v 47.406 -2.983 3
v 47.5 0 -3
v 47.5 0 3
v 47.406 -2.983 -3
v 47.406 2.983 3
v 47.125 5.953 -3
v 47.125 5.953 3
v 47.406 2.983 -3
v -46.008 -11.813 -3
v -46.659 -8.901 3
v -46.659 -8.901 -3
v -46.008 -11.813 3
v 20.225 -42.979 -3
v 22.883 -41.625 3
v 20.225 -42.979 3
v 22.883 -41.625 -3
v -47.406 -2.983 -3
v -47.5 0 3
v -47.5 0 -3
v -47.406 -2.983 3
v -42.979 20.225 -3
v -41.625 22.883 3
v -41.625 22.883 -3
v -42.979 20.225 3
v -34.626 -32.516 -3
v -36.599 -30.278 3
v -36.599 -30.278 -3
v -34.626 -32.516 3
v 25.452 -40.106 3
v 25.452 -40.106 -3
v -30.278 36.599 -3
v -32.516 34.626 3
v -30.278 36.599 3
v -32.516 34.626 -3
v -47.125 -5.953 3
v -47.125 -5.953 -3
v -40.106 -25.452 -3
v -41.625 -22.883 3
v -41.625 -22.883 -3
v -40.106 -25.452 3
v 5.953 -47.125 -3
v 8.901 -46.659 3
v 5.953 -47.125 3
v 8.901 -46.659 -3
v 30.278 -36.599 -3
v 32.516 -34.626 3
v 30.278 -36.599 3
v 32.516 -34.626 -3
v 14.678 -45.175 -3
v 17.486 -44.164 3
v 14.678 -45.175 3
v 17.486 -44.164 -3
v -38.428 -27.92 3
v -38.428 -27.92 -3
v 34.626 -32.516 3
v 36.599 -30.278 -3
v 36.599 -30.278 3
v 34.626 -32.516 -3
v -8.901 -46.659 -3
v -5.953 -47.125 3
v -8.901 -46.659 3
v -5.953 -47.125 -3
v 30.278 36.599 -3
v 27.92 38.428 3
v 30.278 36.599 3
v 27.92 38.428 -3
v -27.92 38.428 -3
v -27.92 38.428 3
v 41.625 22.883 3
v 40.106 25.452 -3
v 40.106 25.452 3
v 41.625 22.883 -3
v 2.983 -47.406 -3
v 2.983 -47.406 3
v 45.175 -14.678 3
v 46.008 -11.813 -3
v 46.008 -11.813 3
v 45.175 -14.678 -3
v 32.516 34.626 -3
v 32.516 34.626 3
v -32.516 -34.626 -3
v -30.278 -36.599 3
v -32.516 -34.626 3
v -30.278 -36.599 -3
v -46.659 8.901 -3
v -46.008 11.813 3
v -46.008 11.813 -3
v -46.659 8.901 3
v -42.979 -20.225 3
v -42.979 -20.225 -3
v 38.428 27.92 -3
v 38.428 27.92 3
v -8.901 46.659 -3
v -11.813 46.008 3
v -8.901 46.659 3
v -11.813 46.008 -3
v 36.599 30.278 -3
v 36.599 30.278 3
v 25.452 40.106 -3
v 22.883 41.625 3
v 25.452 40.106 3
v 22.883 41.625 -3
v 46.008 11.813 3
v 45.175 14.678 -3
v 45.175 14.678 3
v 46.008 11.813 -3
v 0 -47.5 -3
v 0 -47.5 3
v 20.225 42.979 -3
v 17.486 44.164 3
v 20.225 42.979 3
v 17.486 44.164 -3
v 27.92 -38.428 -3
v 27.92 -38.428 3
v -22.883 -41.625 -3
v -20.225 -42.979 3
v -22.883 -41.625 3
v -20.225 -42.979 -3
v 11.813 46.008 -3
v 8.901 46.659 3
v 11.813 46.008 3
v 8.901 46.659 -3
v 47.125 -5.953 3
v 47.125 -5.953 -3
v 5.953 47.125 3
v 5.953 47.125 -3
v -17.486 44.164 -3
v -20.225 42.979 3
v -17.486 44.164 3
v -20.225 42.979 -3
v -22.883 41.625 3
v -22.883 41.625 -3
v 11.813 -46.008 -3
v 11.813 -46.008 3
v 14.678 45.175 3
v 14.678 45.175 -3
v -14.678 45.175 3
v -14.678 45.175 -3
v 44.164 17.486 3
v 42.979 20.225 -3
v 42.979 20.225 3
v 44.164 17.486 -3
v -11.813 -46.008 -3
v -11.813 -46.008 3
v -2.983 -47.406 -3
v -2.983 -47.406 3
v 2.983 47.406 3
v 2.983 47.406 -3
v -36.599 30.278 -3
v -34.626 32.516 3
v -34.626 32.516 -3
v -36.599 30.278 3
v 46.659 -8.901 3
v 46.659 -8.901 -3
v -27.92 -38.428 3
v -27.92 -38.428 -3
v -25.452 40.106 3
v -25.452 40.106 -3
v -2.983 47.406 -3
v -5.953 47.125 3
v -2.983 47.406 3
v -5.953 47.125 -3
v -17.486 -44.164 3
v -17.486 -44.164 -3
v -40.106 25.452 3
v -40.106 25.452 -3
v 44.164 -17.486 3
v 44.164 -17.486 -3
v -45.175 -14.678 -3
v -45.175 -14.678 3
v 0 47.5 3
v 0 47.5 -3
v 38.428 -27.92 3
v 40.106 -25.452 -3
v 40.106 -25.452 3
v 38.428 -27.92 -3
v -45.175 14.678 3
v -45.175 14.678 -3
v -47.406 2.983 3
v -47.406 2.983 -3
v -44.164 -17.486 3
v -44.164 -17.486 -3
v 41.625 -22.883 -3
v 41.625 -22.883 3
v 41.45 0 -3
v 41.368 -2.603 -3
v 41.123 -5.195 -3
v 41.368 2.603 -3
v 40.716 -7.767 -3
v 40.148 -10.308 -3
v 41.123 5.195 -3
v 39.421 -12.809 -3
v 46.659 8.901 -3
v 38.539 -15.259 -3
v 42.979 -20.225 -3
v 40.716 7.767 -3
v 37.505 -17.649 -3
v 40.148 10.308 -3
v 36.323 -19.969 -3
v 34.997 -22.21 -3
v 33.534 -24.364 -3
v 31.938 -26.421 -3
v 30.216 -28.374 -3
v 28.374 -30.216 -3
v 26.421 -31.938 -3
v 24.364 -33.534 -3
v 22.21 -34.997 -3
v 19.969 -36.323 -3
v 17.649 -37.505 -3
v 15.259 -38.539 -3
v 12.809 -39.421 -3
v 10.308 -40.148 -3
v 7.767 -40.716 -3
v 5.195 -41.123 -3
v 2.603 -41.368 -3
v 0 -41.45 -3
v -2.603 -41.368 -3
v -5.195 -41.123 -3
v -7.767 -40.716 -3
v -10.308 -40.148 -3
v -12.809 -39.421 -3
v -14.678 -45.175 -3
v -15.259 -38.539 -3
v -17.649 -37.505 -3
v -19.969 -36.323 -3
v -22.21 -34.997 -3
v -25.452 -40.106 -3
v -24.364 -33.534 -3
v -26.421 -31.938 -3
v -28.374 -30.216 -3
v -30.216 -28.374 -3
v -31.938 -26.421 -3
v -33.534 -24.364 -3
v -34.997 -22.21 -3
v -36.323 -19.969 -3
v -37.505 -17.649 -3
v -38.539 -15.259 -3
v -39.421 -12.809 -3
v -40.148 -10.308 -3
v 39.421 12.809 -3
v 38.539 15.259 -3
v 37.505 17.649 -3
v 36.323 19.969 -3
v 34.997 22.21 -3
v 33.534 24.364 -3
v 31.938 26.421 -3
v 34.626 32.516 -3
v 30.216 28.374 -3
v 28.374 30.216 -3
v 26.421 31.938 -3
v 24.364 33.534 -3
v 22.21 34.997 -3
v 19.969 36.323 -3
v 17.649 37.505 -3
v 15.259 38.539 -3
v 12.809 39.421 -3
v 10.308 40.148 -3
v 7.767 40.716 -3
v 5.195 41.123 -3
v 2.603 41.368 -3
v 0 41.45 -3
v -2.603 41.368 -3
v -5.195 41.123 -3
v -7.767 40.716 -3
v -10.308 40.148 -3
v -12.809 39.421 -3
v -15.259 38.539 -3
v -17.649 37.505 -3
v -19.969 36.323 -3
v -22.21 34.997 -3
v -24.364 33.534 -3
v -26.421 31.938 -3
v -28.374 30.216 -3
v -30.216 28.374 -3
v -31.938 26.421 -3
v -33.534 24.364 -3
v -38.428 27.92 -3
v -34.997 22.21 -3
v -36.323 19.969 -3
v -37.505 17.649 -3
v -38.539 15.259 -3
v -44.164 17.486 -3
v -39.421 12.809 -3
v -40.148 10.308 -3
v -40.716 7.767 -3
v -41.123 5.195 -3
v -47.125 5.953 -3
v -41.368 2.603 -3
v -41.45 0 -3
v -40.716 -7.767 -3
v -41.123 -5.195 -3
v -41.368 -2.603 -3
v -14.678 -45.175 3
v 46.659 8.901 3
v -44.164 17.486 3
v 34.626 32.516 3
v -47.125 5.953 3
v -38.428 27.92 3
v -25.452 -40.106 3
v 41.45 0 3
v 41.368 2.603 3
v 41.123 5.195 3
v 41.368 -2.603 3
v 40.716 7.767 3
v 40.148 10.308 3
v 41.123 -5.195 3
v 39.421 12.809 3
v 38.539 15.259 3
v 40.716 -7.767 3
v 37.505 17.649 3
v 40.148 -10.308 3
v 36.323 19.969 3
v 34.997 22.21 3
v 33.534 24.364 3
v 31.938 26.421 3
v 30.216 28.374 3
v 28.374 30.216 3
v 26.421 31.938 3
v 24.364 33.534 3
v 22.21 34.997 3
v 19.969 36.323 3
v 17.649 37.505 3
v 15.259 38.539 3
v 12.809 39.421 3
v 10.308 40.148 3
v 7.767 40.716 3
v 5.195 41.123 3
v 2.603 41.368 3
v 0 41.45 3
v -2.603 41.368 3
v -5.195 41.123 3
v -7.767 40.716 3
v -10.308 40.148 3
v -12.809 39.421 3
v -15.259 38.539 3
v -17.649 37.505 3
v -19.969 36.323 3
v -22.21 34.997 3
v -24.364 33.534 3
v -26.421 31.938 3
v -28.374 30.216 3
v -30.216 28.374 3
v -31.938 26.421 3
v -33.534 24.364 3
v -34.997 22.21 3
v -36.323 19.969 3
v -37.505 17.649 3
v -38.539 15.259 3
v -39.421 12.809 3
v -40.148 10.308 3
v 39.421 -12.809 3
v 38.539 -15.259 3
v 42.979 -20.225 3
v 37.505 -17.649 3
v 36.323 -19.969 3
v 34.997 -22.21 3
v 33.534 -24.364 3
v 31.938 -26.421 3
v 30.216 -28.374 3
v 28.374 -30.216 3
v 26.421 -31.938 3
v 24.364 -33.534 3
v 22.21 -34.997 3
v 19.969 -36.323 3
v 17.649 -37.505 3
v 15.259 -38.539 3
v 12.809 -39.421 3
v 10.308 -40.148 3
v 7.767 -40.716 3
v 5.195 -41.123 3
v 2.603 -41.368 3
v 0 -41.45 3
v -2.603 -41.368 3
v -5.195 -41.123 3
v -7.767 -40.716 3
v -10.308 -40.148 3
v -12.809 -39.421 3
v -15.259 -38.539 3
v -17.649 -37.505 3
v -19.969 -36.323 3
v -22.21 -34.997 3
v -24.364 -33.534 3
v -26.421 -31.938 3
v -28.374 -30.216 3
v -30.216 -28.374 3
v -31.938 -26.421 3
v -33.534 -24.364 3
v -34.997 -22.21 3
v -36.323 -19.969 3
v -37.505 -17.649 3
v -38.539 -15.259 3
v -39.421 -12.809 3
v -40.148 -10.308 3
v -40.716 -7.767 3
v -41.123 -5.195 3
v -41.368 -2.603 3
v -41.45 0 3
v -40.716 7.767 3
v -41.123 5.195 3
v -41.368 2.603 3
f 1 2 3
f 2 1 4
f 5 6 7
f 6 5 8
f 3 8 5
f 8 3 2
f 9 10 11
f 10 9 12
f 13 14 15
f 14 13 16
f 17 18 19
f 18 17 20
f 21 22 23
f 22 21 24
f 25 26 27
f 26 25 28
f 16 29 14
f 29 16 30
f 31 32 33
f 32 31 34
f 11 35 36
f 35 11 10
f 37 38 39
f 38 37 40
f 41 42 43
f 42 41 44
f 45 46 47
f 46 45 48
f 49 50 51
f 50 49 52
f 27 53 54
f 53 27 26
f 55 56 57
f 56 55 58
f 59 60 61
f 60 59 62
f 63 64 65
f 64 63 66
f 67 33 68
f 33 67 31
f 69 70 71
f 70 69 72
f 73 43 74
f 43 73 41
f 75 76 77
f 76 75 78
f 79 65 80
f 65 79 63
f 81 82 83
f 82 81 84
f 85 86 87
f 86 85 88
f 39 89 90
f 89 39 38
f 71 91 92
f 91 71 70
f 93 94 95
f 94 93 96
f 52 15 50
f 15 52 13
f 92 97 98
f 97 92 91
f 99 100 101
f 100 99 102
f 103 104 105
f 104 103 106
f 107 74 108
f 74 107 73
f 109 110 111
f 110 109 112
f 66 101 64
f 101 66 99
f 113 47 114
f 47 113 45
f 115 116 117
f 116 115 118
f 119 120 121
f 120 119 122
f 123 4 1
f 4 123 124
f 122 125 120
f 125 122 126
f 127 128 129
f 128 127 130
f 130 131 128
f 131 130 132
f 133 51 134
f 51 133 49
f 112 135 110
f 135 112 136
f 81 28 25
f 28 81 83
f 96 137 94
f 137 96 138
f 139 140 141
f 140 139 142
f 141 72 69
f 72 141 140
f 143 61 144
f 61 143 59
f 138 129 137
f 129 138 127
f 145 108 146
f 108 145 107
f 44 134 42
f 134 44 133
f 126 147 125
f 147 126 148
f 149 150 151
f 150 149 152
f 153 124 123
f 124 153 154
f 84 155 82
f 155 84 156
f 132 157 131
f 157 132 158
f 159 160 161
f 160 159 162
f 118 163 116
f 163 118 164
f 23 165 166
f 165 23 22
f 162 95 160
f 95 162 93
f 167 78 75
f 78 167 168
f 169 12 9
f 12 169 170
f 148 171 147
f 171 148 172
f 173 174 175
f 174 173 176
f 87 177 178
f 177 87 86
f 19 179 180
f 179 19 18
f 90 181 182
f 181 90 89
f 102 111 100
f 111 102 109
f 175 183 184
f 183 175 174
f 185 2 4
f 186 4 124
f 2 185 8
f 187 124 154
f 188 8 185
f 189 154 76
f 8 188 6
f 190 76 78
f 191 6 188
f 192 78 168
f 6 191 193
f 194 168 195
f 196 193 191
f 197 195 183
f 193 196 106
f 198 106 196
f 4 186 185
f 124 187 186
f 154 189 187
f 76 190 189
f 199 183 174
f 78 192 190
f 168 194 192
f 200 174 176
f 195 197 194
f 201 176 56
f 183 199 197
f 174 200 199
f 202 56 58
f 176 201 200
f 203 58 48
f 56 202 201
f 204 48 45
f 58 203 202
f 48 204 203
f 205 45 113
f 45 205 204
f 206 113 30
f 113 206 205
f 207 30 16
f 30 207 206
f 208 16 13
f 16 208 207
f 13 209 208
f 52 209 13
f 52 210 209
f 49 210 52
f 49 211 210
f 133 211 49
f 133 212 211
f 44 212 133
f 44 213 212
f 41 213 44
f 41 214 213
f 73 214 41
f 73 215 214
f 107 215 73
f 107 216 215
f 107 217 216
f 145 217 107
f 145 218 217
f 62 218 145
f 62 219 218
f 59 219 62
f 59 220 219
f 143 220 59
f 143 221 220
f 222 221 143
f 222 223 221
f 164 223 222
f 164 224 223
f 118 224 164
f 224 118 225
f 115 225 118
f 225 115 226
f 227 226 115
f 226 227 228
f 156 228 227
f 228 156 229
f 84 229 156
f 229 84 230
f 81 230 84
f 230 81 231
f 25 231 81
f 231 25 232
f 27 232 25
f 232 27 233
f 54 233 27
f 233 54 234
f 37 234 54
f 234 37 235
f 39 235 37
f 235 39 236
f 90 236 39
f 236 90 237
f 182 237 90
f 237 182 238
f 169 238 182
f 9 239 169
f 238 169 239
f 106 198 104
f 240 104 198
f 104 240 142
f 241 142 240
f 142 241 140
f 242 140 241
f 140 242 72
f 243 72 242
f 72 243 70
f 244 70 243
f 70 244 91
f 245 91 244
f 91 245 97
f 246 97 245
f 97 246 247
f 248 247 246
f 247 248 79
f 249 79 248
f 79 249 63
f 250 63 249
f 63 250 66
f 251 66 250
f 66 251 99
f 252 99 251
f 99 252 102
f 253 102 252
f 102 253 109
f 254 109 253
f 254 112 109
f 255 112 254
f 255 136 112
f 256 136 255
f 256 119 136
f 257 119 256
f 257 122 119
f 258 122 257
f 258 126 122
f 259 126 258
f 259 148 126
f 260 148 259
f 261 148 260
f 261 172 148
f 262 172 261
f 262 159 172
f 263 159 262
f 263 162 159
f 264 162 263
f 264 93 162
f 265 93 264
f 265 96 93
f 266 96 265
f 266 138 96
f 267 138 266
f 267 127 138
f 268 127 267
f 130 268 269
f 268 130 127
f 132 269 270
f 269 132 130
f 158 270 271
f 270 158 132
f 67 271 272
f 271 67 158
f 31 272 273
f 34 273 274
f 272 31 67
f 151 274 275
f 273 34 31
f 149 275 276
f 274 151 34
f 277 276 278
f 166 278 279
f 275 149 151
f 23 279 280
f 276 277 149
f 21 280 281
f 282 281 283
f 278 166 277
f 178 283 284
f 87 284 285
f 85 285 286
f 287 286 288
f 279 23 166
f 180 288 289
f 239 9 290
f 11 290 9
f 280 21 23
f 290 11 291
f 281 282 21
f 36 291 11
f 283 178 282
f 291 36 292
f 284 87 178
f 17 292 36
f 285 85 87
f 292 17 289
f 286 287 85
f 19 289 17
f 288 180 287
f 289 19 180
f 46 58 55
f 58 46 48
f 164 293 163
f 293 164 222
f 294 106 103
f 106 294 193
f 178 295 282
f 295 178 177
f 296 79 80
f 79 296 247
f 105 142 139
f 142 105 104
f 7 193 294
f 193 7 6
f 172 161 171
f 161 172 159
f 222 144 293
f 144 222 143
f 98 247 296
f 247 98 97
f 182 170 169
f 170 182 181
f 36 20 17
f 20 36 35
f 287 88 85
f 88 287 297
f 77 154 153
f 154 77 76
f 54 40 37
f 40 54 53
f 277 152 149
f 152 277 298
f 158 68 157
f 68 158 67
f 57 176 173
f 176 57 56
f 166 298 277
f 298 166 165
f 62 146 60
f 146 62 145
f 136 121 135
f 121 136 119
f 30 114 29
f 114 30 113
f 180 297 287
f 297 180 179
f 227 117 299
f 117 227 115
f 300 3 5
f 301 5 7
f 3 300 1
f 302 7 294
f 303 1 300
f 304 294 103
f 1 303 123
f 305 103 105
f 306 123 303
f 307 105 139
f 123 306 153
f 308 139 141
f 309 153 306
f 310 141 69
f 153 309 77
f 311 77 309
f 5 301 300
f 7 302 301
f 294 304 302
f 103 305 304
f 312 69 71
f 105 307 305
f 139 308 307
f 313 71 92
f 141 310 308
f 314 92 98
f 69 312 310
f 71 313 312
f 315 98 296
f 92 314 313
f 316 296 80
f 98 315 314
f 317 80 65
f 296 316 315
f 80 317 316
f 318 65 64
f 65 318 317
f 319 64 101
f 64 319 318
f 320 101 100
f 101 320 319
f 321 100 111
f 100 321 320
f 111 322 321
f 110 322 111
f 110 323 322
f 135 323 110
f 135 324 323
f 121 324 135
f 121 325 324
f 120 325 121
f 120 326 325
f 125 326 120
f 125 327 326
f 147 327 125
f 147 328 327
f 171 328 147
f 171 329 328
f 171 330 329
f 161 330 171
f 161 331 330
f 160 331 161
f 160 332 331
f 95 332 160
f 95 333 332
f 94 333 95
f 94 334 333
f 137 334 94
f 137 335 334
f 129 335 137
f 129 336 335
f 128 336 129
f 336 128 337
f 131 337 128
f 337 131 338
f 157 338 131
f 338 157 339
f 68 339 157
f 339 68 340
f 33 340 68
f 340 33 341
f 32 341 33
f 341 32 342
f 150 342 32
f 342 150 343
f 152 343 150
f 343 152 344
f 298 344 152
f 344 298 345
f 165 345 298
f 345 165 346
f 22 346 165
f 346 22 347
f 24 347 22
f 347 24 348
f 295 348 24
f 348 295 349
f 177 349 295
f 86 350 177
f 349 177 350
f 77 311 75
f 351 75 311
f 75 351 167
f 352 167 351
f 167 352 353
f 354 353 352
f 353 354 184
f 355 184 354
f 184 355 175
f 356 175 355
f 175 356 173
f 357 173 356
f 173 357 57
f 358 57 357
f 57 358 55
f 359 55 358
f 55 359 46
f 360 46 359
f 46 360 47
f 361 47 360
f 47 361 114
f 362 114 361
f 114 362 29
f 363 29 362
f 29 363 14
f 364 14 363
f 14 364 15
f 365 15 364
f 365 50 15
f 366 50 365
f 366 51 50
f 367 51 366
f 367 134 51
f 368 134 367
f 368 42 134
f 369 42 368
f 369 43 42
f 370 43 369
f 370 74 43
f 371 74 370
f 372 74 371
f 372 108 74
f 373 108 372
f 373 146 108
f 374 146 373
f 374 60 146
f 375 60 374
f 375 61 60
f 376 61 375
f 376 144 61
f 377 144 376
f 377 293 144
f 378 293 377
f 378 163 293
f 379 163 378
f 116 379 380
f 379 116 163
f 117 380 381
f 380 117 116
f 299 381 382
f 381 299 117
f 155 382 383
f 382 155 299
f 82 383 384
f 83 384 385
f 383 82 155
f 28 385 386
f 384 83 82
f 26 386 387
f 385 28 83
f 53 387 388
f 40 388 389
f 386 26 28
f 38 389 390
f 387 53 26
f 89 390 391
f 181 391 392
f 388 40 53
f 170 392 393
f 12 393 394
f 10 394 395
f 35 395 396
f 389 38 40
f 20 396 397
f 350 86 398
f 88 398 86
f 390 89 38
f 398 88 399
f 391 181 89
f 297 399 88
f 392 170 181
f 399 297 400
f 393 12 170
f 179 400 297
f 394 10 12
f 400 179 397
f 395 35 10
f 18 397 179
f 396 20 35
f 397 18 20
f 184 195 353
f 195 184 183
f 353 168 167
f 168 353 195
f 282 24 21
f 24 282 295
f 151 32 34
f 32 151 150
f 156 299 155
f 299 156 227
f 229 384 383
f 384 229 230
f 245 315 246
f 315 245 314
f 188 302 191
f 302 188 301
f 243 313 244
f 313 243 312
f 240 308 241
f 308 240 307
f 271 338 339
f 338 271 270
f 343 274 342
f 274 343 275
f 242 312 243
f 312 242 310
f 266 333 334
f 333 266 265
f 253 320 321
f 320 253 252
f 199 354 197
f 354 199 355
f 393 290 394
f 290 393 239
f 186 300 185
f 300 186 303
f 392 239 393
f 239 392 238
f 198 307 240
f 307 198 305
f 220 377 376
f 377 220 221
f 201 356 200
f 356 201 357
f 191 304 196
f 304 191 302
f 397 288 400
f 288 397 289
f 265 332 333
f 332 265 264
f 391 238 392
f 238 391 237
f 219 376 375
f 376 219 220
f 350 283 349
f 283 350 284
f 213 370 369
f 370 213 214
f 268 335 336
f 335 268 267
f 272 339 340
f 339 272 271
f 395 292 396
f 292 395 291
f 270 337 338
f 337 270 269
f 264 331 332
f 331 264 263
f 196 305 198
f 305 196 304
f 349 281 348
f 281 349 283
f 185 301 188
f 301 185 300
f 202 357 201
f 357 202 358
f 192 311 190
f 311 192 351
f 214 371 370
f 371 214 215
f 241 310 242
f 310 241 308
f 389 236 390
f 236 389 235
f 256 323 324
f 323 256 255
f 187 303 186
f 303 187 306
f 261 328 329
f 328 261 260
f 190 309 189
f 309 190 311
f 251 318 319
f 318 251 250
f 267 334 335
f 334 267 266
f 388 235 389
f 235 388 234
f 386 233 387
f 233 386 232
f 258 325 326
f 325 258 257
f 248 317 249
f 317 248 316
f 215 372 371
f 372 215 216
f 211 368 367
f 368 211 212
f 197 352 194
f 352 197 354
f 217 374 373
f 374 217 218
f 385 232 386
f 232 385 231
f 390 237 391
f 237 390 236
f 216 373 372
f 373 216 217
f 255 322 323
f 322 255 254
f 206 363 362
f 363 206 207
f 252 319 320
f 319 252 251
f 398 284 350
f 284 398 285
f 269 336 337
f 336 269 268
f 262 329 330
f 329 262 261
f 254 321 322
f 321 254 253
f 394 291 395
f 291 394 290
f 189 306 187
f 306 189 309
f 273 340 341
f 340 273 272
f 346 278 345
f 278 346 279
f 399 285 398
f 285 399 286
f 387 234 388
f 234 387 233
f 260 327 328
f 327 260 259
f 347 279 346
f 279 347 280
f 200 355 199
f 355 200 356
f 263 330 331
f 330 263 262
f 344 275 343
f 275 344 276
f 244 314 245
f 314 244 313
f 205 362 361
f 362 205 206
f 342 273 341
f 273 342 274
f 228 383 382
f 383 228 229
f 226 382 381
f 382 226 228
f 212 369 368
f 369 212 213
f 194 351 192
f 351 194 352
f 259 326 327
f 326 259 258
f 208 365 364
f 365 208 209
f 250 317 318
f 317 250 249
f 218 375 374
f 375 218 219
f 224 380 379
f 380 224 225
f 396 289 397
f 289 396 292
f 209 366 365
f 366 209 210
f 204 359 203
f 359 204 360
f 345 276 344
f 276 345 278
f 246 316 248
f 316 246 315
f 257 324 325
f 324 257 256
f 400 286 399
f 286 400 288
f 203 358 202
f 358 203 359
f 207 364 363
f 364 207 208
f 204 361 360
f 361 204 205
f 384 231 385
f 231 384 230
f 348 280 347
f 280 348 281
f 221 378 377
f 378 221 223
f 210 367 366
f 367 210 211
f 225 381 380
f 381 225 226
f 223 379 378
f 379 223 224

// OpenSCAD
// This is a primer tray spacer. It makes adapts my primer tray funnel to larger primer trays.
//
// Warning -- some sanding and fitting may be required.
//
// This is licensed under the creative commons+attribution license
//
// To fulfil the attribution requirement, please link to:
// http://www.thingiverse.com/thing:2190725

/* [Main] */

// Define number of facets (large numbers provide better smoothing)
$fn=100;

// Define outside diameter of spacer ring in mm
outside_diameter=95.0;

// Define inside diameter of the spacer ring in mm
inside_diameter=82.9;

// Define height of spacer ring in mm
spacer_height=6.0;

module spacer_ring()
{
	difference()
	{
		cylinder(h=spacer_height,r=outside_diameter/2,center=true);
		cylinder(h=spacer_height+1,r=inside_diameter/2,center=true);
	}
	
}

spacer_ring();
